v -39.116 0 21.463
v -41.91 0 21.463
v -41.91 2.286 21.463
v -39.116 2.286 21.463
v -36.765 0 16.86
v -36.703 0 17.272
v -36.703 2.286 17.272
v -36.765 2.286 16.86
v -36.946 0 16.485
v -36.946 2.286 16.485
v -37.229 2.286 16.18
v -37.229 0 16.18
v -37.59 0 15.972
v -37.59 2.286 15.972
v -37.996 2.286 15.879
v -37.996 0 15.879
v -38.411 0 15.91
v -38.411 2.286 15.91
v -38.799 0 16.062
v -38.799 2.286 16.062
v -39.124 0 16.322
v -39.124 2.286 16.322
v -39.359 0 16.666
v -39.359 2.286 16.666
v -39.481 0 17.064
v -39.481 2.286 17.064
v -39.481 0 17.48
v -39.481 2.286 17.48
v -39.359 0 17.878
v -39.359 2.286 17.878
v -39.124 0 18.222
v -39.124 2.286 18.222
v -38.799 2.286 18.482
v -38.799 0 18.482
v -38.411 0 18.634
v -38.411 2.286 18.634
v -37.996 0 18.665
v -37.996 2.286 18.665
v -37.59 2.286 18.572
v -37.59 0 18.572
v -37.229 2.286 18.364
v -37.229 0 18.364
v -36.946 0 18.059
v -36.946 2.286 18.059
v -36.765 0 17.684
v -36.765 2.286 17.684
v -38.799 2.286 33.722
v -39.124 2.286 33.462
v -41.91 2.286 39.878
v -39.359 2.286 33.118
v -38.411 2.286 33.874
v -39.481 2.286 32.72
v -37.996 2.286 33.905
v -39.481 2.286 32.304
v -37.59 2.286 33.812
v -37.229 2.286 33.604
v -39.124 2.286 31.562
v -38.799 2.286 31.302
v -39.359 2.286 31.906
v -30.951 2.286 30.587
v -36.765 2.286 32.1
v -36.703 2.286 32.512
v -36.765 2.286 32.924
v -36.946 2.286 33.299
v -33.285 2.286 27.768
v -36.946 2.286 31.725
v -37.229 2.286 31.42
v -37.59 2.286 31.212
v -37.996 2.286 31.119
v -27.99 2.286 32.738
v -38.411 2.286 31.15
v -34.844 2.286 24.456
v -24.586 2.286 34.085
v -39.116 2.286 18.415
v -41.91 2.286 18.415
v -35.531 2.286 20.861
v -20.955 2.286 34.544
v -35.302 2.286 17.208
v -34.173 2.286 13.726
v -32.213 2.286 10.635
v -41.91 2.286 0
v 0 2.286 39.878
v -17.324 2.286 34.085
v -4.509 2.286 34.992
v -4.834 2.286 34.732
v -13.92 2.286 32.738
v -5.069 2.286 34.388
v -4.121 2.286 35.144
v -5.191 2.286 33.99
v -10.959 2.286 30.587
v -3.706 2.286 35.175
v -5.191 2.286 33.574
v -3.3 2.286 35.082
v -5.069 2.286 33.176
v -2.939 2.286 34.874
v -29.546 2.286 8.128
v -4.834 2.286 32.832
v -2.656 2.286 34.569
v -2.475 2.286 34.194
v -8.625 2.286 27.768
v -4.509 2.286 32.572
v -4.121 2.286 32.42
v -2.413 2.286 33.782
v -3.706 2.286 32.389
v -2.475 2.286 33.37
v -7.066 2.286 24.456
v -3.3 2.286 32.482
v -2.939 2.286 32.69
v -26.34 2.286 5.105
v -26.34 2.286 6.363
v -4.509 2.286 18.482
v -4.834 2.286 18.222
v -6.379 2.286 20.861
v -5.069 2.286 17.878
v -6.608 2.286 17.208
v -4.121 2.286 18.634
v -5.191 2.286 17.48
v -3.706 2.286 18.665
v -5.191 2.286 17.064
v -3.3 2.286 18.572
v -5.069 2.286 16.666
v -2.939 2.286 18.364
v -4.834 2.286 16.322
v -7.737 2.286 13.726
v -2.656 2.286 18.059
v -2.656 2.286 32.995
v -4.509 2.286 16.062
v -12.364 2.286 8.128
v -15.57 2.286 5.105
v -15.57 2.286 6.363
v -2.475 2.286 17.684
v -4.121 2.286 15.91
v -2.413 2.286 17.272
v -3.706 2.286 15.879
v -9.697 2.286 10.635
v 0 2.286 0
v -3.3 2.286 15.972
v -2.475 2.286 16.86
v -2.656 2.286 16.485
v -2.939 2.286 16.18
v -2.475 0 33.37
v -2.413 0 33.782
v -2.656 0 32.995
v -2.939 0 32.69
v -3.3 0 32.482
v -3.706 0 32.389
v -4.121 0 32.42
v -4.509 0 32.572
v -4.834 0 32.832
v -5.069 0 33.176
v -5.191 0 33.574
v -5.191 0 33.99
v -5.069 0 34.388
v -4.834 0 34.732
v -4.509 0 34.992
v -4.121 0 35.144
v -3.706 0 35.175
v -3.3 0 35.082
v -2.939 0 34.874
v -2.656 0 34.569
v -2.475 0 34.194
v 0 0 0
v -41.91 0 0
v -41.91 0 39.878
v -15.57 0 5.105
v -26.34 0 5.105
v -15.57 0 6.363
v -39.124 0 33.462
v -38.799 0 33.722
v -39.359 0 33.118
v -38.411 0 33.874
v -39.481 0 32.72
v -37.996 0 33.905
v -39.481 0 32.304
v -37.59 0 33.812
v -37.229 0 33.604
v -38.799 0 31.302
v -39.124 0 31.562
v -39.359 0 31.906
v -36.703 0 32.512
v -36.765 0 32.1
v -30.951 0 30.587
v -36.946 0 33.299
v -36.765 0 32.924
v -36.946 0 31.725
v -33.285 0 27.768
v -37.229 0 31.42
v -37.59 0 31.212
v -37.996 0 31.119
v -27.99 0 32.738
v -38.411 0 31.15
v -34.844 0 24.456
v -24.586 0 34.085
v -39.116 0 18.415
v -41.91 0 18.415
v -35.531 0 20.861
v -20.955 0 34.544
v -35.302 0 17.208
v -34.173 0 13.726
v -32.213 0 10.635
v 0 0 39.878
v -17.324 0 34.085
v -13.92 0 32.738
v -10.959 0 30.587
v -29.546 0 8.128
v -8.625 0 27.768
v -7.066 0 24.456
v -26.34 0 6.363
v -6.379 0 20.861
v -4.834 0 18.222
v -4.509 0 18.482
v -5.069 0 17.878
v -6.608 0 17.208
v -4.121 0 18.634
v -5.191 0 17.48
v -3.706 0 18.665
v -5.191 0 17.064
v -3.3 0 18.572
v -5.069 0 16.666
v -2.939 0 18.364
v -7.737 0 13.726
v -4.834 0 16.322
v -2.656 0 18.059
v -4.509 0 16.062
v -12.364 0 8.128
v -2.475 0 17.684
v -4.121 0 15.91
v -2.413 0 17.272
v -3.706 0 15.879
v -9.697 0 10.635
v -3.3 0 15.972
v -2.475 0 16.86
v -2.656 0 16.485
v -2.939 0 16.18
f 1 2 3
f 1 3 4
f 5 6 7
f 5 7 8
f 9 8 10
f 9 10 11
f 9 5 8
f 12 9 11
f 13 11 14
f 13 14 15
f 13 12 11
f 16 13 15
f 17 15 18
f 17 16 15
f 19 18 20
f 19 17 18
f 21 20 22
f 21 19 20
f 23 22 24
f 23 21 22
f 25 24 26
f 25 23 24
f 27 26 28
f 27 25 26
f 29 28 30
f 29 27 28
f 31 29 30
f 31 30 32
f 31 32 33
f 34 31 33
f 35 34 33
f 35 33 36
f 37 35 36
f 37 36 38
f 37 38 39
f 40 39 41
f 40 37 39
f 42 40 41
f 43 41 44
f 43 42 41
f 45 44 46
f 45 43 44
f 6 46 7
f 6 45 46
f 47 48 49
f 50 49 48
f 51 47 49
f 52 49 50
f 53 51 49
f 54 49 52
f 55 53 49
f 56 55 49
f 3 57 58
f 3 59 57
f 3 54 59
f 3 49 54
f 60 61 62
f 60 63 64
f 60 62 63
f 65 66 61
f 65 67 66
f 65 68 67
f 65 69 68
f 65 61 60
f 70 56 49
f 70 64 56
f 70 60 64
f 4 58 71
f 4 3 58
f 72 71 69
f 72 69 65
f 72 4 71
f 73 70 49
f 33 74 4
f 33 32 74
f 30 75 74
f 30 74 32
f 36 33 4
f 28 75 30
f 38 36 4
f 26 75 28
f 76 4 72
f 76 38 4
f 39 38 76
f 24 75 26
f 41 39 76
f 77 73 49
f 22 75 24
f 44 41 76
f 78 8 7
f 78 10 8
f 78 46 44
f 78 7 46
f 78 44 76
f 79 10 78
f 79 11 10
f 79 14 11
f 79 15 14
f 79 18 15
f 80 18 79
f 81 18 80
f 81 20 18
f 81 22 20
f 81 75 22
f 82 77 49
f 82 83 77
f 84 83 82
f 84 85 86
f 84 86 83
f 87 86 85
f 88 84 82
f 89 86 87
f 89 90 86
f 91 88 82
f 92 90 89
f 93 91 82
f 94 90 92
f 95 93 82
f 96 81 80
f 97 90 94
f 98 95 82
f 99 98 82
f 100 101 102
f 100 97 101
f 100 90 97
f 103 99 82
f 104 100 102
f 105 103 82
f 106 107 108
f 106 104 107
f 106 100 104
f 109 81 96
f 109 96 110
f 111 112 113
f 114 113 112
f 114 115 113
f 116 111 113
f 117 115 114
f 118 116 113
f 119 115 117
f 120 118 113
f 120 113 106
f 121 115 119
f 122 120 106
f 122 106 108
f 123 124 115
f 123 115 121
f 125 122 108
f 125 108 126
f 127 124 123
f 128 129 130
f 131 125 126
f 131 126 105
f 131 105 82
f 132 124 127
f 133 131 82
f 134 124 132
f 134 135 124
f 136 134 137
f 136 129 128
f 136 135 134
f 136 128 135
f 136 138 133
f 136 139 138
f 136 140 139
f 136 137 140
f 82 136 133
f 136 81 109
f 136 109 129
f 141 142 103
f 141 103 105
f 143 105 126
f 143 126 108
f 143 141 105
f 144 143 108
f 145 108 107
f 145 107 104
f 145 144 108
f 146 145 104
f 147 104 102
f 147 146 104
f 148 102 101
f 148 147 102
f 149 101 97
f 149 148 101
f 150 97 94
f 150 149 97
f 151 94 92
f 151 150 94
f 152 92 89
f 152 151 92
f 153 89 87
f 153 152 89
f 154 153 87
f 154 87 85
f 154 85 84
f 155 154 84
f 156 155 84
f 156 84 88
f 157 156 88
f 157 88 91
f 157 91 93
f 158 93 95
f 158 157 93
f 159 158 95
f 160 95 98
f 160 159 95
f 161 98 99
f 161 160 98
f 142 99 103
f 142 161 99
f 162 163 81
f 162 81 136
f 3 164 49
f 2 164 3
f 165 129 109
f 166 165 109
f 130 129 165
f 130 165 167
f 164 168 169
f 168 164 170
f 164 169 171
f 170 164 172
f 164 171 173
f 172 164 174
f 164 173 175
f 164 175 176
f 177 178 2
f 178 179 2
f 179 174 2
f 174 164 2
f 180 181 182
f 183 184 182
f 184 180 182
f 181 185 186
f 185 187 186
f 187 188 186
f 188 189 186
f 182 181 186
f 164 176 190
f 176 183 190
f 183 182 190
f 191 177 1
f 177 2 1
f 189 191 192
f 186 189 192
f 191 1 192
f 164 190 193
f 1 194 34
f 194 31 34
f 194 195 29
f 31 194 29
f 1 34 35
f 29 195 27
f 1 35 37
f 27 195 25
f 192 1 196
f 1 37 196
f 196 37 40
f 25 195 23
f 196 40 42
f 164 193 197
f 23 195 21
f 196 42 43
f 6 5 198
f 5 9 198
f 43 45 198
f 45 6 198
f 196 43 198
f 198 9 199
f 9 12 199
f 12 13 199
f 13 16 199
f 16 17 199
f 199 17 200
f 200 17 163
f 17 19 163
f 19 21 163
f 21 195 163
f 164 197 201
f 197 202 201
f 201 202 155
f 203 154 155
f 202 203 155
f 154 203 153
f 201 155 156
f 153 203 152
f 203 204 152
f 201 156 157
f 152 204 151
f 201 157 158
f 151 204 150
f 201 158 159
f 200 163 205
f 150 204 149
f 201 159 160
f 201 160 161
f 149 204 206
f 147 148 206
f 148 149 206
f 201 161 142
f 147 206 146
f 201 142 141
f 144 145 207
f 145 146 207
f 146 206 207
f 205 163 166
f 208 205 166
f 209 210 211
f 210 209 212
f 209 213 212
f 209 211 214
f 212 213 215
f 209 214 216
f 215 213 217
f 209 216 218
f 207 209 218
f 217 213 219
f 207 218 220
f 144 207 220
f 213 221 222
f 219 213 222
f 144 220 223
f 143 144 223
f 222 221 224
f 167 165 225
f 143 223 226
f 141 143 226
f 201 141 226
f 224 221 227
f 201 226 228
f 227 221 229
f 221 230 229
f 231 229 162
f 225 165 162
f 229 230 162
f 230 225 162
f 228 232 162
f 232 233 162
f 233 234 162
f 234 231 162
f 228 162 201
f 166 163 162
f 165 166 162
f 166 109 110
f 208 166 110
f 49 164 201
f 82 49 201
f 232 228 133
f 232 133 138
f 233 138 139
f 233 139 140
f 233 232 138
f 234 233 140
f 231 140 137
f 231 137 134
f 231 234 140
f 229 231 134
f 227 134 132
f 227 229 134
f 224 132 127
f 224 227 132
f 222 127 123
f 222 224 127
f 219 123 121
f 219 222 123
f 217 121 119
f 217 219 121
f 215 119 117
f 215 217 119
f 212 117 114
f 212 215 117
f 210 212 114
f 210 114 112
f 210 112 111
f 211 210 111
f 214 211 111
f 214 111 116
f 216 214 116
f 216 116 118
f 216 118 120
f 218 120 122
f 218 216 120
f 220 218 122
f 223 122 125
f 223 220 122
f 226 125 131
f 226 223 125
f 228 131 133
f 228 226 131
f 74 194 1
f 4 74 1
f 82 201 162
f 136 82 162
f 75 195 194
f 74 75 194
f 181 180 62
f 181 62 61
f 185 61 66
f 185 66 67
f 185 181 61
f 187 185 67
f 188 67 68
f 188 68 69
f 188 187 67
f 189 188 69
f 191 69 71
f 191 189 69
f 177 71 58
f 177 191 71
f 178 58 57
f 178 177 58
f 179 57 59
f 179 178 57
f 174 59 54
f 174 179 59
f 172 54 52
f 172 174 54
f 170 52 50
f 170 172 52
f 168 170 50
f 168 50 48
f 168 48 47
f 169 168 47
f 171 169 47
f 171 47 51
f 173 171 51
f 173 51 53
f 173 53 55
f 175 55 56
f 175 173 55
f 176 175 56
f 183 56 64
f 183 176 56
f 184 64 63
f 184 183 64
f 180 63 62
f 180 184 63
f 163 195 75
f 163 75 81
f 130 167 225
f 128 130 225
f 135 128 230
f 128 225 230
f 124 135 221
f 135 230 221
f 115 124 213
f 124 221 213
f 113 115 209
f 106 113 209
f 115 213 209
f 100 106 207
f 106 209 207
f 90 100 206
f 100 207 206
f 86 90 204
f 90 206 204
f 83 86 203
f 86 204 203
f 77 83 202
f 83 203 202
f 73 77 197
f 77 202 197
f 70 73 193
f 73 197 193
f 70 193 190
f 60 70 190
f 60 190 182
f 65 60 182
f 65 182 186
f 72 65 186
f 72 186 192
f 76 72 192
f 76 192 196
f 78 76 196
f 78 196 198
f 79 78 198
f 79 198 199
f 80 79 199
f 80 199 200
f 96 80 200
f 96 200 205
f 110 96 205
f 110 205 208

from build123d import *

# Parameters (mm, degrees)
SKETCH5_W      = 41.91
SKETCH5_H      = 39.878
SKETCH5_R      = 1.397
EXTRUDE3_DEPTH = 2.286
SKETCH6_W      = 10.7696
SKETCH6_H      = 20.1676
EXTRUDE4_DEPTH = 3.286
SKETCH7_R      = 14.605
SKETCH7_W      = 2.794
SKETCH7_H      = 3.048
EXTRUDE5_DEPTH = 3.286


with BuildPart() as part:
    # Sketch5 → Extrude3 (new body)
    with BuildSketch(Plane(origin=(0, 0, 0), x_dir=(1, 0, 0), z_dir=(0, 1, 0))):
        with Locations((-20.955, -19.939)):
            Rectangle(SKETCH5_W, SKETCH5_H)
        with Locations((-38.1, -17.272)):
            Circle(SKETCH5_R, mode=Mode.SUBTRACT)
        with Locations((-38.1, -32.512)):
            Circle(SKETCH5_R, mode=Mode.SUBTRACT)
        with Locations((-3.81, -33.782)):
            Circle(SKETCH5_R, mode=Mode.SUBTRACT)
        with Locations((-3.81, -17.272)):
            Circle(SKETCH5_R, mode=Mode.SUBTRACT)
    extrude(amount=EXTRUDE3_DEPTH)

    # Sketch6 → Extrude4 (cut, through all)
    with BuildSketch(Plane(origin=(0, 2.286, 0), x_dir=(-1, 0, 0), z_dir=(0, 1, 0))):
        with Locations((20.955, 15.1892)):
            Rectangle(SKETCH6_W, SKETCH6_H)
    extrude(amount=-EXTRUDE4_DEPTH, mode=Mode.SUBTRACT)

    # Sketch7 → Extrude5 (cut, through all)
    with BuildSketch(Plane.XZ):
        with Locations((-20.955, 19.939)):
            Circle(SKETCH7_R)
        with Locations((-40.513, 19.939)):
            Rectangle(SKETCH7_W, SKETCH7_H)
    extrude(amount=-EXTRUDE5_DEPTH, mode=Mode.SUBTRACT)


solid = part.part
